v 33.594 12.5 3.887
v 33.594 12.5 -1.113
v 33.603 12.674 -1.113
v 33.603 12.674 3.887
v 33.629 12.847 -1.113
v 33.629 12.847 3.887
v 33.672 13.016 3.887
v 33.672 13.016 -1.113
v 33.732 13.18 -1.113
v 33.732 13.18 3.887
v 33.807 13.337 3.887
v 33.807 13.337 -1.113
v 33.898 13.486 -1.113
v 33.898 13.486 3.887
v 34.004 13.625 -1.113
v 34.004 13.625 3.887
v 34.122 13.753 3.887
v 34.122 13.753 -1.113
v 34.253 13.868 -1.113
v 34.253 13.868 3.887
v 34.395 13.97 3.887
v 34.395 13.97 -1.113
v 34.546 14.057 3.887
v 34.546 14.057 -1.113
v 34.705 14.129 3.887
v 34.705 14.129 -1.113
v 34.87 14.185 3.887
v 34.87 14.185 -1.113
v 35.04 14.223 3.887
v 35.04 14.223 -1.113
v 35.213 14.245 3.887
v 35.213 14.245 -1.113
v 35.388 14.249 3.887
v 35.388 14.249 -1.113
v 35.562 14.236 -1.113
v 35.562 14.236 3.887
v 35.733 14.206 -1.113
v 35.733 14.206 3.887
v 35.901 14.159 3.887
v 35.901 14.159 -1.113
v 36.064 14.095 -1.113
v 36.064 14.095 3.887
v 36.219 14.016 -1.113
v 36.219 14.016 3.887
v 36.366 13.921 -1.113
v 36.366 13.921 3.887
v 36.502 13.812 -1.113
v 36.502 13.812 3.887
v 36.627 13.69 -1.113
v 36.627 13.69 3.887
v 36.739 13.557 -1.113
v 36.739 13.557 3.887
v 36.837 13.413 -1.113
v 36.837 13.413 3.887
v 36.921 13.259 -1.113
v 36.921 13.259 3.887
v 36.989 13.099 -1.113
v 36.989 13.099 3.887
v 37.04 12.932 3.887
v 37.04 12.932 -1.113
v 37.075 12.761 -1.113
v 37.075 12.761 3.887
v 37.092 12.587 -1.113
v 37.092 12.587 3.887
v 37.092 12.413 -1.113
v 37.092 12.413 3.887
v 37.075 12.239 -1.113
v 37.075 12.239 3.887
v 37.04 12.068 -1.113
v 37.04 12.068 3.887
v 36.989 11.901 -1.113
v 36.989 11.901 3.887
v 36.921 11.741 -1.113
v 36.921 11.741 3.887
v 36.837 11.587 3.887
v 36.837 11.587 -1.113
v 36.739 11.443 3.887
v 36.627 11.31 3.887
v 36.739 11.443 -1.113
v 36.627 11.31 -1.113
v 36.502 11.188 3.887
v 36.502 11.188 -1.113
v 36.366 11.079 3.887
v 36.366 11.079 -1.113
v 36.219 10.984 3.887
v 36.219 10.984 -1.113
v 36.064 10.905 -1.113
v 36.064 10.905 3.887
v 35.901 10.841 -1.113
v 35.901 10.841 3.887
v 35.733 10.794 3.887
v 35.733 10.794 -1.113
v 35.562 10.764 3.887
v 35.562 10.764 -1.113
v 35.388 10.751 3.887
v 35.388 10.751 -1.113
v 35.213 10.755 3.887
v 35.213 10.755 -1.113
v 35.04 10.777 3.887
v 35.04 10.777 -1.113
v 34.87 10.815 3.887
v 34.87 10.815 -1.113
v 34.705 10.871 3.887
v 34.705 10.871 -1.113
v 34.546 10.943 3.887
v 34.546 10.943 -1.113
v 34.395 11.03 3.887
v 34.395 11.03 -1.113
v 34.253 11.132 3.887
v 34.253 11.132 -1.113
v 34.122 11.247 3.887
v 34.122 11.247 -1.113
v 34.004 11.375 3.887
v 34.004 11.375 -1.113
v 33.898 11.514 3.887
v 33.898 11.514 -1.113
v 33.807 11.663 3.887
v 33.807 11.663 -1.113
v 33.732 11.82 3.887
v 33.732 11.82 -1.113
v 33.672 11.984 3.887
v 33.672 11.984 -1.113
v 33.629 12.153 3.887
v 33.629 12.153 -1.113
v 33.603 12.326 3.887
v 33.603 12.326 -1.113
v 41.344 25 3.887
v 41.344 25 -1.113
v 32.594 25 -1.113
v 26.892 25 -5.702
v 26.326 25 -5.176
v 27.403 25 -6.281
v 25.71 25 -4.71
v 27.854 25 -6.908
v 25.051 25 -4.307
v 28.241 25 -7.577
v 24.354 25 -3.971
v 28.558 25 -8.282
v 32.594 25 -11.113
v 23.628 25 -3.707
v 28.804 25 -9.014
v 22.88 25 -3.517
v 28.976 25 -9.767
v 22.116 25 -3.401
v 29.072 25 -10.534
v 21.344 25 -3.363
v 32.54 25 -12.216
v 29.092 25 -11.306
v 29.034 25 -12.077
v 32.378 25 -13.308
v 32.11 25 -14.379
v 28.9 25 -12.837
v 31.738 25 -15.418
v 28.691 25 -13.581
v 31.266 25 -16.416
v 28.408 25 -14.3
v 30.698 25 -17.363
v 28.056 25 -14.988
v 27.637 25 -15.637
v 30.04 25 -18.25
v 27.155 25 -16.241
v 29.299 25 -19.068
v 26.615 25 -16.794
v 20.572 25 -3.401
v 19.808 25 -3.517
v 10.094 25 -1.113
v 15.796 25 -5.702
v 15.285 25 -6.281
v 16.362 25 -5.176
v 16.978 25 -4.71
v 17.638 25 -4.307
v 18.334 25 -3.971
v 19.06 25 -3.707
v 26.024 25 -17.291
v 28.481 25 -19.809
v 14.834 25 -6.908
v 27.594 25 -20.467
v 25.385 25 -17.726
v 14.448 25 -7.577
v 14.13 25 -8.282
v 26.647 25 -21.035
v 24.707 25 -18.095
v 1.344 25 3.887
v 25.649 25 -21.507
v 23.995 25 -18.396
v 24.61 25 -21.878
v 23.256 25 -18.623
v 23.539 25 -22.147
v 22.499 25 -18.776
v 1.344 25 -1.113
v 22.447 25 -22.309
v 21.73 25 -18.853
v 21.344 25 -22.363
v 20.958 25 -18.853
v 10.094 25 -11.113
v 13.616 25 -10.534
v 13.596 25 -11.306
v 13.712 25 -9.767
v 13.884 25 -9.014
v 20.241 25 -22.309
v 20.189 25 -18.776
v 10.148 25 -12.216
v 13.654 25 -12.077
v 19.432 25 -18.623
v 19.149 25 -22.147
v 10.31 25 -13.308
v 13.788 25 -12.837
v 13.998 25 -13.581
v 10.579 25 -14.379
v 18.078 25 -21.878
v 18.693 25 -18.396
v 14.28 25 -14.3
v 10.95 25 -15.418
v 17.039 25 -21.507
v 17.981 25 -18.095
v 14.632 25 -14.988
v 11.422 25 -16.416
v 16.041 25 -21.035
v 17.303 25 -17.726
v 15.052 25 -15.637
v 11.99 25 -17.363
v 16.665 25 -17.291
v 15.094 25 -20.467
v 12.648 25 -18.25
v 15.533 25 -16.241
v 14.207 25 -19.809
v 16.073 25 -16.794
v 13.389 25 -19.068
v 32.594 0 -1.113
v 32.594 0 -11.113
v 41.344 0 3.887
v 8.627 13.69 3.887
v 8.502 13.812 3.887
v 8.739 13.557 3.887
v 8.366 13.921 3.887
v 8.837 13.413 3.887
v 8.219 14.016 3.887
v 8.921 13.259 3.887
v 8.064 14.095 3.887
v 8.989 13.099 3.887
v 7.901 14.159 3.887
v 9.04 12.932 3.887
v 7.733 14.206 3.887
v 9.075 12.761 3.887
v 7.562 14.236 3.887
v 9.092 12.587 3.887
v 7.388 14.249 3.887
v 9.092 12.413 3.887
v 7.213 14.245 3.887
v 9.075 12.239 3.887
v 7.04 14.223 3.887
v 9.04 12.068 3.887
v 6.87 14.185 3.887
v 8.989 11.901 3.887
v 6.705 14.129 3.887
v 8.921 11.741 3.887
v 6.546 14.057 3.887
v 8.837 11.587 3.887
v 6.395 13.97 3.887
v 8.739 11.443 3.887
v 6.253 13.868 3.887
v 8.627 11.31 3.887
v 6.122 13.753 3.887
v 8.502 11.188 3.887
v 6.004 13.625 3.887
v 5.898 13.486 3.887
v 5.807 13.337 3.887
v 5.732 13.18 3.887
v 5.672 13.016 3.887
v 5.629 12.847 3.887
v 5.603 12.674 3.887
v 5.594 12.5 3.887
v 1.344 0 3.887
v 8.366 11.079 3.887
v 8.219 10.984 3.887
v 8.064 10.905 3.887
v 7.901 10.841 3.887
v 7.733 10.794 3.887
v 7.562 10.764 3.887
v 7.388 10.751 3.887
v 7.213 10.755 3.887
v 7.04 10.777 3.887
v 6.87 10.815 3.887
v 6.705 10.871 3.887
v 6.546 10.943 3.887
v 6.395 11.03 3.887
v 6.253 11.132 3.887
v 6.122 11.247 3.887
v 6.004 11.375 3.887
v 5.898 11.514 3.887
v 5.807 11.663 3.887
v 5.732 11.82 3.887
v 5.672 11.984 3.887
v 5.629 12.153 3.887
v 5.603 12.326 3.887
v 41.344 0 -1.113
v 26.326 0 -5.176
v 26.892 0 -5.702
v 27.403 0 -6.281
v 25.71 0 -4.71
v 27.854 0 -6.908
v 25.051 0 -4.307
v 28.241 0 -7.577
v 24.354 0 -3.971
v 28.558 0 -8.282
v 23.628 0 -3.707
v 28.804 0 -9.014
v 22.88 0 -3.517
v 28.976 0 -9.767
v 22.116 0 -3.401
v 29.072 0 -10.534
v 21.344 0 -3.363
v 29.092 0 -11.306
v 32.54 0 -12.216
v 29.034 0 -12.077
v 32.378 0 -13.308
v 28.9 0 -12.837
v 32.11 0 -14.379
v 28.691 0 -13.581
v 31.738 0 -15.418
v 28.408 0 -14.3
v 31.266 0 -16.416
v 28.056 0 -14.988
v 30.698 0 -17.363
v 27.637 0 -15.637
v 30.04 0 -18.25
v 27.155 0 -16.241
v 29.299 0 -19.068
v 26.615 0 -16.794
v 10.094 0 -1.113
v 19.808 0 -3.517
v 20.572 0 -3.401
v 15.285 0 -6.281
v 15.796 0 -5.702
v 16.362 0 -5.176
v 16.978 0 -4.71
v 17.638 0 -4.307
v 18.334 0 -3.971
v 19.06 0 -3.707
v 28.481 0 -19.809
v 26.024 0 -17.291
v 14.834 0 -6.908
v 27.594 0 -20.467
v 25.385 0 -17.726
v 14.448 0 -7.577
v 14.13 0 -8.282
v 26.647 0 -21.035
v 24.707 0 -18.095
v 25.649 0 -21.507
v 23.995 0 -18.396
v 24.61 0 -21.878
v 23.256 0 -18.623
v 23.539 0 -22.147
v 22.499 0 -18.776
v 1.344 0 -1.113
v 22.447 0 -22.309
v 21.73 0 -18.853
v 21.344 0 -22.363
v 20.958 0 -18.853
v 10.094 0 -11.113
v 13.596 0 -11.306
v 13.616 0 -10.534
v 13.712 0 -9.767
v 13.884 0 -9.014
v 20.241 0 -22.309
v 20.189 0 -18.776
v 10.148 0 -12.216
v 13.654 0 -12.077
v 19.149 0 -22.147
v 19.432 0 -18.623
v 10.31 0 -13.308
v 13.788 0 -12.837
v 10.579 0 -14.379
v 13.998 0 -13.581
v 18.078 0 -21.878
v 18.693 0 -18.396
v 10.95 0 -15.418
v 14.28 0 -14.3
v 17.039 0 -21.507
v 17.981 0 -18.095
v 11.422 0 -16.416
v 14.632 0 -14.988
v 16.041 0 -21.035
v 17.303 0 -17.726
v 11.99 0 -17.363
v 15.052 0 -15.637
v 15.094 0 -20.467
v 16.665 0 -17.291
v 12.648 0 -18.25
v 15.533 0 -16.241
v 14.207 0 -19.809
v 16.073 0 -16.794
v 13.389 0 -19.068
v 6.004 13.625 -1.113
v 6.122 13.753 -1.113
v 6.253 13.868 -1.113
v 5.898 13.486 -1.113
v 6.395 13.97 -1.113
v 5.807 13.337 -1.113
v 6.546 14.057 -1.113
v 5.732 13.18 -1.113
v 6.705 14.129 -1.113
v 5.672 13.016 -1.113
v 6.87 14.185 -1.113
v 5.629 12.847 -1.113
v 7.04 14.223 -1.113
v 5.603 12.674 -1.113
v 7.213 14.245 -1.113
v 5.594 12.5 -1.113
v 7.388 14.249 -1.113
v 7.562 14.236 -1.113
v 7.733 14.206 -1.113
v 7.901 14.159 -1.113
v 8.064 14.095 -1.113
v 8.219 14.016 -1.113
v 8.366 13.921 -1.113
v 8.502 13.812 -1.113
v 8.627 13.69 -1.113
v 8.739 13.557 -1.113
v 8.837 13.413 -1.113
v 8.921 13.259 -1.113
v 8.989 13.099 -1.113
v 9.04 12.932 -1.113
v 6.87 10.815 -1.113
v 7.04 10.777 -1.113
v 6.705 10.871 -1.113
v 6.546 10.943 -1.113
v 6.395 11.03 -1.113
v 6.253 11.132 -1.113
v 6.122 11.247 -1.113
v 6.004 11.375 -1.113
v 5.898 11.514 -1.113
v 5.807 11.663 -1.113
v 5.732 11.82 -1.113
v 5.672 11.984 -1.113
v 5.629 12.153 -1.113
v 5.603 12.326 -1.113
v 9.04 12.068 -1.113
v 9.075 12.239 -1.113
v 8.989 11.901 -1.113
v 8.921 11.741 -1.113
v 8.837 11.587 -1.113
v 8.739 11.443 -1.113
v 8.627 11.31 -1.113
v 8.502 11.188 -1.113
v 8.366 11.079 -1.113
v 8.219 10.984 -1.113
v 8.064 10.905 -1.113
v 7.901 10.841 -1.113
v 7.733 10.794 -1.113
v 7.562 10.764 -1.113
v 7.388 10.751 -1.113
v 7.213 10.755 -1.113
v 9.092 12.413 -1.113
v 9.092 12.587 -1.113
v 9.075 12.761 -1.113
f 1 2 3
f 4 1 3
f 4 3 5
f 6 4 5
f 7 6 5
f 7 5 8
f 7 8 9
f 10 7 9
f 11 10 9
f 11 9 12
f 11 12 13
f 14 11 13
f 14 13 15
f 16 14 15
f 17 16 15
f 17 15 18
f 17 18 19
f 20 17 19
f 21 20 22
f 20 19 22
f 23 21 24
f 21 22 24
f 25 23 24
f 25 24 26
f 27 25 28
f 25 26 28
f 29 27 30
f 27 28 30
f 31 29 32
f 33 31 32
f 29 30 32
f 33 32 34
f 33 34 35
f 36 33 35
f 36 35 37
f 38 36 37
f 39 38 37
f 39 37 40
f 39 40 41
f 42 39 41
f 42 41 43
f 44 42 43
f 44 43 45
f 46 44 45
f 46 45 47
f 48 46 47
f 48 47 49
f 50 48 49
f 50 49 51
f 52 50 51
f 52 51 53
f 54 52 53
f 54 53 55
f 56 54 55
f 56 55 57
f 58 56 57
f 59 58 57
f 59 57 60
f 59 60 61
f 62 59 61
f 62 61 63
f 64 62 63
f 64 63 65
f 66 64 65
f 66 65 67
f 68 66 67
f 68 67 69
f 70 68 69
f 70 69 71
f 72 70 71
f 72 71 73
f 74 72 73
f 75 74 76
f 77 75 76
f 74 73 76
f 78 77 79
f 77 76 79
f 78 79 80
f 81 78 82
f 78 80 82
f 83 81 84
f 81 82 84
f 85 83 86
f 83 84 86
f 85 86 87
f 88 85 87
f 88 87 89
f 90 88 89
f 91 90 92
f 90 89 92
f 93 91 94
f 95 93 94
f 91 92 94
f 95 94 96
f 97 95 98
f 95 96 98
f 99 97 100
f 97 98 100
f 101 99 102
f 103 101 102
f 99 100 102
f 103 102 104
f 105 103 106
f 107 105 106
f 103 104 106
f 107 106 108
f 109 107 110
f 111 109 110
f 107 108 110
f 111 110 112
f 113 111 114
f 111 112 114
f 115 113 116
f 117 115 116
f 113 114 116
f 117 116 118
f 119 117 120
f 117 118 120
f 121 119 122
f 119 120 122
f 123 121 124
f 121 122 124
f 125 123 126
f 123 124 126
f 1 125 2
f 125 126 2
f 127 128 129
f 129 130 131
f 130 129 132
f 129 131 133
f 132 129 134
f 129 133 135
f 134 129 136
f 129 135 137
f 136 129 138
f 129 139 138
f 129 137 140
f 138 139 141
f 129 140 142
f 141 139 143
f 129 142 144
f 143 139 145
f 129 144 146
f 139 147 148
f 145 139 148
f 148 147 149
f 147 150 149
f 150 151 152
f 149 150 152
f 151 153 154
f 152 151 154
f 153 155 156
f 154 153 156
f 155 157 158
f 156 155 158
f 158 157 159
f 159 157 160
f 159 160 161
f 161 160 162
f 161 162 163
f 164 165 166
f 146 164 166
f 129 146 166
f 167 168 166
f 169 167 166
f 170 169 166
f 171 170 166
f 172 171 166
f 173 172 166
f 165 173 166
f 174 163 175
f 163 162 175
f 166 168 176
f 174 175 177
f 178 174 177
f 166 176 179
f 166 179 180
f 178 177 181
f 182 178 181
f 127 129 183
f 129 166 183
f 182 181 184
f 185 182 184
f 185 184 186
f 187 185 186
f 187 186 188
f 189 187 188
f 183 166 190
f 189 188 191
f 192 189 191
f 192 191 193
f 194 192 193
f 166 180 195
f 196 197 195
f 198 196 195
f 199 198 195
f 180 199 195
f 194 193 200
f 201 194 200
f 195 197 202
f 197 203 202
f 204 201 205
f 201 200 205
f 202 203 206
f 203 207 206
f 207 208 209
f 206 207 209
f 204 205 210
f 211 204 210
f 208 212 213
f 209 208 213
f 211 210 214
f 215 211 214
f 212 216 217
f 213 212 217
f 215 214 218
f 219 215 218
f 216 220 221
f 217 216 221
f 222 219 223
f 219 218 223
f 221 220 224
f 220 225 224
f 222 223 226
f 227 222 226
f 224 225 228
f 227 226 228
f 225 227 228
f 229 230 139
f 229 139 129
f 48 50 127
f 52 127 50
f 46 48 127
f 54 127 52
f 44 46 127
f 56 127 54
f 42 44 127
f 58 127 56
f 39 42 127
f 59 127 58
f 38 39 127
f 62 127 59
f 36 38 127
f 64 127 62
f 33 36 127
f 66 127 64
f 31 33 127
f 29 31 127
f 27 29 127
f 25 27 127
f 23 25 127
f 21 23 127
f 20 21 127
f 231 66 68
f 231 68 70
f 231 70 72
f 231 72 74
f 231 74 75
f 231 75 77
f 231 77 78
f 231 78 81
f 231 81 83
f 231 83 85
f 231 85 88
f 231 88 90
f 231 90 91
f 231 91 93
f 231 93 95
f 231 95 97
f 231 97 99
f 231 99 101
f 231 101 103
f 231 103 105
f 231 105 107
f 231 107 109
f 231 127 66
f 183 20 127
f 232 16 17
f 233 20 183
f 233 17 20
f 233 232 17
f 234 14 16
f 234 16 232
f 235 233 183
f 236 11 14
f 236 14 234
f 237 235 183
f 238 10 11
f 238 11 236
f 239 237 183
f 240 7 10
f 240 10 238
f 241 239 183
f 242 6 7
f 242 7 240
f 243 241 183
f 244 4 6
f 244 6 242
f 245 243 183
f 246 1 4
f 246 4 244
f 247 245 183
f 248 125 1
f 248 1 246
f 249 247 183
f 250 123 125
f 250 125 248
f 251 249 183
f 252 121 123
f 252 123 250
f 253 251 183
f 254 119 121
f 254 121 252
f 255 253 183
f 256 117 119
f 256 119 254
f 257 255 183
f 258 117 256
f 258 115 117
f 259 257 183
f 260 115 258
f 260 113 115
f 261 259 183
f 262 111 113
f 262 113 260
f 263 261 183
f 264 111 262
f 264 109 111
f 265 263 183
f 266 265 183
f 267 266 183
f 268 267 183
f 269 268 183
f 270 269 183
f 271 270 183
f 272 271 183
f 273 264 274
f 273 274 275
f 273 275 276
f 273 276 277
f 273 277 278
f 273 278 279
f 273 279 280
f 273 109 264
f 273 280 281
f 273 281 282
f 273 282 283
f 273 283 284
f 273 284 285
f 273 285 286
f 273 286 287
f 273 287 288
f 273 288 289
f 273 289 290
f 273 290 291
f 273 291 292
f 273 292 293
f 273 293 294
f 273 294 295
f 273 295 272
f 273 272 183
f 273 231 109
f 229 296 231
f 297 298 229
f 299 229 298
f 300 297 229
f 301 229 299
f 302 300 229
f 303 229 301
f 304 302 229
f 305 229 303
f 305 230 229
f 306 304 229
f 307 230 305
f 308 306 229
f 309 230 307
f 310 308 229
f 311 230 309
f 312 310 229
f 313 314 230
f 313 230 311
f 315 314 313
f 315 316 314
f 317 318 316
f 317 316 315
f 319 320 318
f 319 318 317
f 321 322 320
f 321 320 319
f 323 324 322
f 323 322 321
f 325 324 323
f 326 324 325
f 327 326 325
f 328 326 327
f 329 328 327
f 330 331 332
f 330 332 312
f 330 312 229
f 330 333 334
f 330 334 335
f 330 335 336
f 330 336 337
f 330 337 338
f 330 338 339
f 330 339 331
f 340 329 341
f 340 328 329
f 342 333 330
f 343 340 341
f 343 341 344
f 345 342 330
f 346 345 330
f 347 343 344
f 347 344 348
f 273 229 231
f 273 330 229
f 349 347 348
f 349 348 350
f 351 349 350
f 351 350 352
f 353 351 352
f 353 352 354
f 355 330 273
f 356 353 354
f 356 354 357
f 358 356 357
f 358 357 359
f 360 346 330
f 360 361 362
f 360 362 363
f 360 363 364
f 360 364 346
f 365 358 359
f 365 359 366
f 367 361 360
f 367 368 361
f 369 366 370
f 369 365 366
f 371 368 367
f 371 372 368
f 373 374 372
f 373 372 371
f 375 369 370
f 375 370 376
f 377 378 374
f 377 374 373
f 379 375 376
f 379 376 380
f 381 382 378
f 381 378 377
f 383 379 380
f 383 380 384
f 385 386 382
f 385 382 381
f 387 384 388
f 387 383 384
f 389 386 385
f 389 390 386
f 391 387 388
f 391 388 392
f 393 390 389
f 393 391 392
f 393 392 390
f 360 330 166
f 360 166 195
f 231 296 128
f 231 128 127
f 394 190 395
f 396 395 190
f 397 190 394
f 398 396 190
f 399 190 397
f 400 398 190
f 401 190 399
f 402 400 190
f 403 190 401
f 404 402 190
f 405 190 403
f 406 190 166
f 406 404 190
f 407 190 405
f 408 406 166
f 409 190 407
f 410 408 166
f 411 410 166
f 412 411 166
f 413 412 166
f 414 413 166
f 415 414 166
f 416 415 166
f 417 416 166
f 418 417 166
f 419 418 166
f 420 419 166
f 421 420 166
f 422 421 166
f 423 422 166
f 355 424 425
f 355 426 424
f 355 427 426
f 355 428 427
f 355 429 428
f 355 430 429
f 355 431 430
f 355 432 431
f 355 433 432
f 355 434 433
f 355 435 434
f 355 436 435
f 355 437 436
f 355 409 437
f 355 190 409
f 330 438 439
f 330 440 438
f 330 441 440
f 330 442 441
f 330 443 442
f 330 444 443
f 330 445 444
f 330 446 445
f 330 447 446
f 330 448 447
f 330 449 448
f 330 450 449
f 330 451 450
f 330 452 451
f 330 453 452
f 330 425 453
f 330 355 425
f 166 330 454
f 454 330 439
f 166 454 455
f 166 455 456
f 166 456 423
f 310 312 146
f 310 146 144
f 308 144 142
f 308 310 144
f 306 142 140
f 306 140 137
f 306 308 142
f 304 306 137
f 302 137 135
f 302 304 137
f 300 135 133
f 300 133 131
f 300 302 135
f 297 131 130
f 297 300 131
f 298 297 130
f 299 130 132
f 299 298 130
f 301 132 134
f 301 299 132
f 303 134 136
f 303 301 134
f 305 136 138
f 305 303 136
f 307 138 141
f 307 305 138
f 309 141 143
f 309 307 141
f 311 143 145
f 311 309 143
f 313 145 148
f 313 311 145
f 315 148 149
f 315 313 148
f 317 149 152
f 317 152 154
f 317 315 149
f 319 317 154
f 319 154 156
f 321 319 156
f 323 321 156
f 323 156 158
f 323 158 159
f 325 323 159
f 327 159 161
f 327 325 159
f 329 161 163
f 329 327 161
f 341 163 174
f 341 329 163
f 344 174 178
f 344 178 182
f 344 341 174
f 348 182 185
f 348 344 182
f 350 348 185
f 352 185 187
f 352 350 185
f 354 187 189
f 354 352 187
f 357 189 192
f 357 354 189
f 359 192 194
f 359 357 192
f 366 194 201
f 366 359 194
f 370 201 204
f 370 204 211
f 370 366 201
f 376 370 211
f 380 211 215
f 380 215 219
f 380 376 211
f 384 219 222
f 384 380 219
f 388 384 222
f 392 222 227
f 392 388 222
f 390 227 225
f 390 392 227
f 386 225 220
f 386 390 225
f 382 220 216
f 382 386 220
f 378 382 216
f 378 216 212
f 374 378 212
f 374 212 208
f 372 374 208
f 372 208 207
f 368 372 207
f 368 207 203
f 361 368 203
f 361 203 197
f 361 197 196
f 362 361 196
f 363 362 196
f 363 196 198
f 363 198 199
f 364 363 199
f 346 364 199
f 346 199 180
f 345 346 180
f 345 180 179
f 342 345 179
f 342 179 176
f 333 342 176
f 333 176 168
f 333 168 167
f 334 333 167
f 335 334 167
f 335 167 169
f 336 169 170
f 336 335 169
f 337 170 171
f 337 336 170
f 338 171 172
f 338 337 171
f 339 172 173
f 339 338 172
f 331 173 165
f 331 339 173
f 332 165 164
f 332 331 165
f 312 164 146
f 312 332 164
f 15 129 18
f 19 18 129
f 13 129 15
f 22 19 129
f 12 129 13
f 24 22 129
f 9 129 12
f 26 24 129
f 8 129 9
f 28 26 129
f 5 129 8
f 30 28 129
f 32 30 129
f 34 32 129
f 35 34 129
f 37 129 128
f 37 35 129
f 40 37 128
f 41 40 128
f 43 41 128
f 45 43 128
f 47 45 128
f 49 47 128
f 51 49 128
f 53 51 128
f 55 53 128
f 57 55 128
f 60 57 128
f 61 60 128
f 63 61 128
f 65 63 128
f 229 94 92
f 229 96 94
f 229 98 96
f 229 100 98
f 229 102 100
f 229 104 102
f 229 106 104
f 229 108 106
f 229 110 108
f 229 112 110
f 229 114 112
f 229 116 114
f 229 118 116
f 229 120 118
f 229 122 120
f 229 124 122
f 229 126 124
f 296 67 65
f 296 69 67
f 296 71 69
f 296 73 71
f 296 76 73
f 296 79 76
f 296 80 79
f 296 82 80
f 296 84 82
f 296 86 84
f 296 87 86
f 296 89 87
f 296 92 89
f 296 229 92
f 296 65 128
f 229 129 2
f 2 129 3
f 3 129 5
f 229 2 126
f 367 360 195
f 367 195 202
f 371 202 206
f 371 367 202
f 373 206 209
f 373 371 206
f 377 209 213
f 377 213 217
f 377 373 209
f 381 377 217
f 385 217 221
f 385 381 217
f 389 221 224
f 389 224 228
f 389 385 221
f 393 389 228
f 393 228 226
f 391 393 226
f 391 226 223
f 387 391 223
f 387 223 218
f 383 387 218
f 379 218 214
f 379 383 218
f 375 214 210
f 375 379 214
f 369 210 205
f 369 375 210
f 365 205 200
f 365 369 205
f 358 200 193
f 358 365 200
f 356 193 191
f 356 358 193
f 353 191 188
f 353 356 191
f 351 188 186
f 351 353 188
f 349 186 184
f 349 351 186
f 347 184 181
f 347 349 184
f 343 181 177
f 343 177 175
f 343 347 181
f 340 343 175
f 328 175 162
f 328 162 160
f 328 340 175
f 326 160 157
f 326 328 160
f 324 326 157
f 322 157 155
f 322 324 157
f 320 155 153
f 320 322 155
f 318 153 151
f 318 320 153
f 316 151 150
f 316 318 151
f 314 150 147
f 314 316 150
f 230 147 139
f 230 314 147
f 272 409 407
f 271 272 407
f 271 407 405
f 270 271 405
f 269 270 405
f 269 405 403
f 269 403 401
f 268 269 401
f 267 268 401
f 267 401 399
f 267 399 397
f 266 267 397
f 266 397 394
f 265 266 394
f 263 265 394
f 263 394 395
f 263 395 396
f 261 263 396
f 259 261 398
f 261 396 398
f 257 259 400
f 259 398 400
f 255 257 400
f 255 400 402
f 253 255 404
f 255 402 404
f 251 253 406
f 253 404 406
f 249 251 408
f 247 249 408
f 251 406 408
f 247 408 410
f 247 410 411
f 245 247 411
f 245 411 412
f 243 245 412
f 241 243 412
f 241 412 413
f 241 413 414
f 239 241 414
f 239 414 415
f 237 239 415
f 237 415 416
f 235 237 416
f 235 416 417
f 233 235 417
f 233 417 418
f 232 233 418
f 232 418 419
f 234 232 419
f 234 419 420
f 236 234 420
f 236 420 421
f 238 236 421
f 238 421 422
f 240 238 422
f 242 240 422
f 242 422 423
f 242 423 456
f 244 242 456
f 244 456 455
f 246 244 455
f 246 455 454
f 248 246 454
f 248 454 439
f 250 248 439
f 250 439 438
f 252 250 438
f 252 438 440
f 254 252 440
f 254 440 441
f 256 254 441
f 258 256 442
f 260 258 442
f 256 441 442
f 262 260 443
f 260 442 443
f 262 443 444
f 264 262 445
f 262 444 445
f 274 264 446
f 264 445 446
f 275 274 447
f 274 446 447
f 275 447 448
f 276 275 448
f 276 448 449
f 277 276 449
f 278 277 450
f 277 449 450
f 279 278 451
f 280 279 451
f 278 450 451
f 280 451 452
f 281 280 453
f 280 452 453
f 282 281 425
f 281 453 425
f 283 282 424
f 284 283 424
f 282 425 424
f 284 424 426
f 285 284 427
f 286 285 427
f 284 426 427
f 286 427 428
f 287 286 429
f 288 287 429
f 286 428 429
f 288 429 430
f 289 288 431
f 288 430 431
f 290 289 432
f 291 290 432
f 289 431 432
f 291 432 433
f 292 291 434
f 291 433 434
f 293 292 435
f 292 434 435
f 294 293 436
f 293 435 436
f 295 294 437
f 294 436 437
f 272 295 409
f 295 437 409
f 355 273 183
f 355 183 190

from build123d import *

# Parameters (mm, degrees)
SKETCH_1_R          = 7.75
EXTRUDE_1_DEPTH     = 25
SKETCH_2_R          = 1.75
CUT_EXTRUDE_1_DEPTH = 53.781587215


with BuildPart() as part:
    # 草图1 → 凸台-拉伸1 (new body)
    with BuildSketch(Plane(origin=(0, 0, 0), x_dir=(1, 0, 0), z_dir=(0, 1, 0))):
        with BuildLine():
            Line((1.344086022, 1.112903226), (10.094086022, 1.112903226))
            Line((10.094086022, 1.112903226), (10.094086022, 11.112903226))
            ThreePointArc((10.094086022, 11.112903226), (21.344086022, 22.362903226), (32.594086022, 11.112903226))
            Line((32.594086022, 11.112903226), (32.594086022, 1.112903226))
            Line((32.594086022, 1.112903226), (41.344086022, 1.112903226))
            Line((41.344086022, 1.112903226), (41.344086022, -3.887096774))
            Line((41.344086022, -3.887096774), (1.344086022, -3.887096774))
            Line((1.344086022, -3.887096774), (1.344086022, 1.112903226))
        make_face()
        with Locations(Location((21.344086022, 11.112903226, 0), (0, 0, 270))):
            Circle(SKETCH_1_R, mode=Mode.SUBTRACT)
    extrude(amount=EXTRUDE_1_DEPTH)

    # 草图2 → 切除-拉伸1 (cut, through all)
    with BuildSketch(Plane(origin=(0, 0, -1.112903226), x_dir=(-1, 0, 0), z_dir=(0, 0, -1))):
        with Locations((-35.344086022, 12.5)):
            Circle(SKETCH_2_R)
        with Locations((-7.344086022, 12.5)):
            Circle(SKETCH_2_R)
    extrude(amount=-CUT_EXTRUDE_1_DEPTH, mode=Mode.SUBTRACT)


solid = part.part
